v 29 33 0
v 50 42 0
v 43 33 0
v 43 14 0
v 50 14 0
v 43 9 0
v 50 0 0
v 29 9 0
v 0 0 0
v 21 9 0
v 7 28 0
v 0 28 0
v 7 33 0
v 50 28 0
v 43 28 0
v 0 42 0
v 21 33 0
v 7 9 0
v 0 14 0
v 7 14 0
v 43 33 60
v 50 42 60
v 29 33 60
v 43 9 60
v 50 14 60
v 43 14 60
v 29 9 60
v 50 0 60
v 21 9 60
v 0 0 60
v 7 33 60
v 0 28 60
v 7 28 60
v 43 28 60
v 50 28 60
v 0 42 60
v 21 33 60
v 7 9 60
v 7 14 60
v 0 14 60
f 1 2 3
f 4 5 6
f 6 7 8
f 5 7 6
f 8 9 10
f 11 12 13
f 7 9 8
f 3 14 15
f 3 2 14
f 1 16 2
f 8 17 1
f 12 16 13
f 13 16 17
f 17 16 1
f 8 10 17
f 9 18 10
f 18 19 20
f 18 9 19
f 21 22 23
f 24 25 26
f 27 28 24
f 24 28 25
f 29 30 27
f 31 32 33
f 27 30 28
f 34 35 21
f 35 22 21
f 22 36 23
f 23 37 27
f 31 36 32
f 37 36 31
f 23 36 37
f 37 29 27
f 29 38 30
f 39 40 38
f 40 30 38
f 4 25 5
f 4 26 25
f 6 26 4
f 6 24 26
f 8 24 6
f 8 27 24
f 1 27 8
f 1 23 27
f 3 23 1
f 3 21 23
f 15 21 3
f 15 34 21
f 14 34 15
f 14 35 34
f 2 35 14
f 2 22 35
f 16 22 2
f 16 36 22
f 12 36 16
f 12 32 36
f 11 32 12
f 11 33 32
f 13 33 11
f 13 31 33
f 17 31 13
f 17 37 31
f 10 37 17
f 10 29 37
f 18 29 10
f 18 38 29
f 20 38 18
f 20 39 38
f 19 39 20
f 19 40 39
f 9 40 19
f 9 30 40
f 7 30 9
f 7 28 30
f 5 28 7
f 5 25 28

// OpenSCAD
$fn = 32;

// ----------------------------------------------------------------------
// T-slot rail: 50 x 42 mm section, 60 mm long
// ----------------------------------------------------------------------

// --- parameters (mm) ---
profile_height = 60;      // extrusion height
profile_points = 20;      // points of the closed outline

profile = [[0, 0], [50, 0], [50, 14], [43, 14], [43, 9], [29, 9], [29, 33], [43, 33], [43, 28], [50, 28], [50, 42], [0, 42], [0, 28], [7, 28], [7, 33], [21, 33], [21, 9], [7, 9], [7, 14], [0, 14]];  // single closed polygon, 20 points, counter clockwise

// --- the one profile operation ---
linear_extrude(height = profile_height) polygon(points = profile);
